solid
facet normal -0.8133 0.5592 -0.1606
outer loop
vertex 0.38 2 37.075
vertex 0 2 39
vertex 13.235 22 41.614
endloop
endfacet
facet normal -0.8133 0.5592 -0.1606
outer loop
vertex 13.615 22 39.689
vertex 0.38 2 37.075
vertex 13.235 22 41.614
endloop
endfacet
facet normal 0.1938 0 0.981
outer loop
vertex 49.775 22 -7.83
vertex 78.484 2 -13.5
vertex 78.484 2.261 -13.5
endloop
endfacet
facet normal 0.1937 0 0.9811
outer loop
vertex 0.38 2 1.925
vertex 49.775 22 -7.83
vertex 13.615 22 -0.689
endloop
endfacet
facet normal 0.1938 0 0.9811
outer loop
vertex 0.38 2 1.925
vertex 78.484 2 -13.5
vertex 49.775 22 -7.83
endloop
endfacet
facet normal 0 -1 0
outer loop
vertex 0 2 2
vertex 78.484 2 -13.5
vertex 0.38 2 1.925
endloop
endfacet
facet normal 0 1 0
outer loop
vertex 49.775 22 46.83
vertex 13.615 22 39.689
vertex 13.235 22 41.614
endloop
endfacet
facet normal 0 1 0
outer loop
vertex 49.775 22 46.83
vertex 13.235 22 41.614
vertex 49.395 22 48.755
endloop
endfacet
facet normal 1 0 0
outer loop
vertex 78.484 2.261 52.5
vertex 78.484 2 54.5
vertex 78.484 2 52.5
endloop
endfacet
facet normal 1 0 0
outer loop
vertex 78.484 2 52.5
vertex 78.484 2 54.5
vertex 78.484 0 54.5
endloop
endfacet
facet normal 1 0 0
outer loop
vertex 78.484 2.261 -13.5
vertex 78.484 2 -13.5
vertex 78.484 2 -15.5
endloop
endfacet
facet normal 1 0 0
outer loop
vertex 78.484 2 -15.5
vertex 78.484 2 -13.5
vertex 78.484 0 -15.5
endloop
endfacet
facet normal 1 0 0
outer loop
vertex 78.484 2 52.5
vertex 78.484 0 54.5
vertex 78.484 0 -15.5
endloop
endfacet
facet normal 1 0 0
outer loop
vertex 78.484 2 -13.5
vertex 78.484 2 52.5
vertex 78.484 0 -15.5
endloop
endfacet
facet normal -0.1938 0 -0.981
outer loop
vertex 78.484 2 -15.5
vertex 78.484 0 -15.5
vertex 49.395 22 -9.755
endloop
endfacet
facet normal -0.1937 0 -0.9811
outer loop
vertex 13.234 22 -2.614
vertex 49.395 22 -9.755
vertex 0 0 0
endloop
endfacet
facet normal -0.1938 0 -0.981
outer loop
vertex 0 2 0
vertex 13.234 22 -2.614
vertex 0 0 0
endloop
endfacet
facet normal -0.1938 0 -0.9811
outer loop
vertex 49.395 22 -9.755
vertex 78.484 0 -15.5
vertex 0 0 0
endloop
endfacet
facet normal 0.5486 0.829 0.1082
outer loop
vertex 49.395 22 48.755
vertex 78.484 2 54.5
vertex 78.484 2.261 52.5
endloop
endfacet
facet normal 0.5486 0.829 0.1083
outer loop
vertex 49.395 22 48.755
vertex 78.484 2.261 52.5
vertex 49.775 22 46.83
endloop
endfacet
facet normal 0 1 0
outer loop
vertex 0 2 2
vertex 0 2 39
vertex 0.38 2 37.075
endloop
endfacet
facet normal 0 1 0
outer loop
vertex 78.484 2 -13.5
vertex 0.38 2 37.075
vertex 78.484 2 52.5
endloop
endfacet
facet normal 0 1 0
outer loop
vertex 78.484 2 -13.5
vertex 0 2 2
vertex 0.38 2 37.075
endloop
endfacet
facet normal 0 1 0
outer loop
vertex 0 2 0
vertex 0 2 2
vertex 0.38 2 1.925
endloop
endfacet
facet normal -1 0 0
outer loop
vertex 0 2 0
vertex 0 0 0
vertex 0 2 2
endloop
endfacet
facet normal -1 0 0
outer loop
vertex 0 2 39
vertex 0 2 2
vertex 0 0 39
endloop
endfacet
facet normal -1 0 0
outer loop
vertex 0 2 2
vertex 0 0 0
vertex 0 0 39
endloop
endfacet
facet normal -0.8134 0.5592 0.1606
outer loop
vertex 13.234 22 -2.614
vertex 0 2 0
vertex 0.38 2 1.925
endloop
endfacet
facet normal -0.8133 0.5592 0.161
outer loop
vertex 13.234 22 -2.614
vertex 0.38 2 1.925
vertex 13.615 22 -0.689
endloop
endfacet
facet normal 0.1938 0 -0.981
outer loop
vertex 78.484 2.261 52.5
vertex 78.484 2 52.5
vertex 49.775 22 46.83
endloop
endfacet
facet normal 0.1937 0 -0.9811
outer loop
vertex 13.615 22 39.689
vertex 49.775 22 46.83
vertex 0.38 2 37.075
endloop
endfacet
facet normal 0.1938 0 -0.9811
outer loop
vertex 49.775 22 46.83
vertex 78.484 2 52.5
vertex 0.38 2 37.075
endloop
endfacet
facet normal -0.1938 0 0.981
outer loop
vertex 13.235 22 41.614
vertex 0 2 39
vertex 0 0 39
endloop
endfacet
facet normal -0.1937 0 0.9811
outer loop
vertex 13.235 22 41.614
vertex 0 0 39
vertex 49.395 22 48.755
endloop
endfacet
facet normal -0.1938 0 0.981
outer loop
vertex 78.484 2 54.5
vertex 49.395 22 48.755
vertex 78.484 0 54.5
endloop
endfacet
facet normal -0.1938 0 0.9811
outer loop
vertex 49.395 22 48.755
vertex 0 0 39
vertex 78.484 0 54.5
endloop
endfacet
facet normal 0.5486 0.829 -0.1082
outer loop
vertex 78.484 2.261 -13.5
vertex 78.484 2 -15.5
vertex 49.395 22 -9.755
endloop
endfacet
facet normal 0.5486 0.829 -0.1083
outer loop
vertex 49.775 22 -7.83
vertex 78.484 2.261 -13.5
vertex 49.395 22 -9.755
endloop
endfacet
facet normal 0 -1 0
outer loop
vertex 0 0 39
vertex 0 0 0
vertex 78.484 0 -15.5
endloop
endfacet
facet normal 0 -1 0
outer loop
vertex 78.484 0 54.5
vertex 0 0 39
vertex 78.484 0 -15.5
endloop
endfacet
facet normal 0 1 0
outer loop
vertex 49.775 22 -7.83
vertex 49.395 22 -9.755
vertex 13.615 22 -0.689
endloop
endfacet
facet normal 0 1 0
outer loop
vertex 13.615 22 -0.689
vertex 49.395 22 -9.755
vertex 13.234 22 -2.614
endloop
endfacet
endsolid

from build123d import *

# Parameters (mm, degrees)
BOSS_EXTRUDE1_DEPTH = 2
BOSS_EXTRUDE2_DEPTH = 20
CUT_EXTRUDE6_DEPTH  = 5
CUT_EXTRUDE7_DEPTH  = 5
CUT_EXTRUDE8_DEPTH  = 5
CUT_EXTRUDE9_DEPTH  = 5


with BuildPart() as part:
    # Sketch1 → Boss-Extrude1 (new body)
    with BuildSketch(Plane(origin=(0, 0, 0), x_dir=(1, 0, 0), z_dir=(0, 1, 0))):
        Polygon((0, 0), (0, -39), (78.484074818, -54.5), (78.484074818, 15.5), align=None)
    extrude(amount=BOSS_EXTRUDE1_DEPTH)

    # Sketch2 → Boss-Extrude2 (add)
    with BuildSketch(Plane(origin=(0, 2, 0), x_dir=(1, 0, 0), z_dir=(0, 1, 0))):
        Polygon((0, -39), (78.484074818, -54.5), (78.484074818, -52.5), (0, -37), align=None)
        Polygon((78.484074818, 15.5), (78.484074818, 13.5), (0, -2), (0, 0), align=None)
    extrude(amount=BOSS_EXTRUDE2_DEPTH)

    # Sketch3 → Cut-Extrude6 (cut)
    with BuildSketch(Plane(origin=(-7.413066129, 0, 37.535976563), x_dir=(0.98105093522202, 0, 0.19375000000000017), z_dir=(-0.19375000000000017, 0, 0.98105093522202))):
        Polygon((21.046420337, 22), (2.156848068, 22), (2.156848068, 2), (7.55625, 2), align=None)
    extrude(amount=-CUT_EXTRUDE6_DEPTH, mode=Mode.SUBTRACT)

    # Sketch4 → Cut-Extrude7 (cut)
    with BuildSketch(Plane(origin=(0, 0, 0), x_dir=(-0.98105093522202, 0, 0.1937499999999999), z_dir=(-0.19374999999999987, 0, -0.9810509352220199))):
        Polygon((-13.489984999, 22), (7.971845258, 22), (7.971845258, 2.000274775), (0, 2.000274775), align=None)
    extrude(amount=-CUT_EXTRUDE7_DEPTH, mode=Mode.SUBTRACT)

    # Sketch6 → Cut-Extrude8 (cut)
    with BuildSketch(Plane(origin=(-7.413066129, 0, 37.535976563), x_dir=(0.98105093522202, 0, 0.19375000000000017), z_dir=(-0.19375000000000017, 0, 0.98105093522202))):
        Polygon((57.90503063, 22), (98.623999419, 22), (98.623999419, 2), (87.55625, 2), align=None)
    extrude(amount=-CUT_EXTRUDE8_DEPTH, mode=Mode.SUBTRACT)

    # Sketch7 → Cut-Extrude9 (cut)
    with BuildSketch(Plane(origin=(0, 0, 0), x_dir=(-0.98105093522202, 0, 0.1937499999999999), z_dir=(-0.19374999999999987, 0, -0.9810509352220199))):
        Polygon((-50.34878063, 22), (-88.981830345, 22), (-88.981830345, 2), (-80, 2), align=None)
    extrude(amount=-CUT_EXTRUDE9_DEPTH, mode=Mode.SUBTRACT)


solid = part.part
